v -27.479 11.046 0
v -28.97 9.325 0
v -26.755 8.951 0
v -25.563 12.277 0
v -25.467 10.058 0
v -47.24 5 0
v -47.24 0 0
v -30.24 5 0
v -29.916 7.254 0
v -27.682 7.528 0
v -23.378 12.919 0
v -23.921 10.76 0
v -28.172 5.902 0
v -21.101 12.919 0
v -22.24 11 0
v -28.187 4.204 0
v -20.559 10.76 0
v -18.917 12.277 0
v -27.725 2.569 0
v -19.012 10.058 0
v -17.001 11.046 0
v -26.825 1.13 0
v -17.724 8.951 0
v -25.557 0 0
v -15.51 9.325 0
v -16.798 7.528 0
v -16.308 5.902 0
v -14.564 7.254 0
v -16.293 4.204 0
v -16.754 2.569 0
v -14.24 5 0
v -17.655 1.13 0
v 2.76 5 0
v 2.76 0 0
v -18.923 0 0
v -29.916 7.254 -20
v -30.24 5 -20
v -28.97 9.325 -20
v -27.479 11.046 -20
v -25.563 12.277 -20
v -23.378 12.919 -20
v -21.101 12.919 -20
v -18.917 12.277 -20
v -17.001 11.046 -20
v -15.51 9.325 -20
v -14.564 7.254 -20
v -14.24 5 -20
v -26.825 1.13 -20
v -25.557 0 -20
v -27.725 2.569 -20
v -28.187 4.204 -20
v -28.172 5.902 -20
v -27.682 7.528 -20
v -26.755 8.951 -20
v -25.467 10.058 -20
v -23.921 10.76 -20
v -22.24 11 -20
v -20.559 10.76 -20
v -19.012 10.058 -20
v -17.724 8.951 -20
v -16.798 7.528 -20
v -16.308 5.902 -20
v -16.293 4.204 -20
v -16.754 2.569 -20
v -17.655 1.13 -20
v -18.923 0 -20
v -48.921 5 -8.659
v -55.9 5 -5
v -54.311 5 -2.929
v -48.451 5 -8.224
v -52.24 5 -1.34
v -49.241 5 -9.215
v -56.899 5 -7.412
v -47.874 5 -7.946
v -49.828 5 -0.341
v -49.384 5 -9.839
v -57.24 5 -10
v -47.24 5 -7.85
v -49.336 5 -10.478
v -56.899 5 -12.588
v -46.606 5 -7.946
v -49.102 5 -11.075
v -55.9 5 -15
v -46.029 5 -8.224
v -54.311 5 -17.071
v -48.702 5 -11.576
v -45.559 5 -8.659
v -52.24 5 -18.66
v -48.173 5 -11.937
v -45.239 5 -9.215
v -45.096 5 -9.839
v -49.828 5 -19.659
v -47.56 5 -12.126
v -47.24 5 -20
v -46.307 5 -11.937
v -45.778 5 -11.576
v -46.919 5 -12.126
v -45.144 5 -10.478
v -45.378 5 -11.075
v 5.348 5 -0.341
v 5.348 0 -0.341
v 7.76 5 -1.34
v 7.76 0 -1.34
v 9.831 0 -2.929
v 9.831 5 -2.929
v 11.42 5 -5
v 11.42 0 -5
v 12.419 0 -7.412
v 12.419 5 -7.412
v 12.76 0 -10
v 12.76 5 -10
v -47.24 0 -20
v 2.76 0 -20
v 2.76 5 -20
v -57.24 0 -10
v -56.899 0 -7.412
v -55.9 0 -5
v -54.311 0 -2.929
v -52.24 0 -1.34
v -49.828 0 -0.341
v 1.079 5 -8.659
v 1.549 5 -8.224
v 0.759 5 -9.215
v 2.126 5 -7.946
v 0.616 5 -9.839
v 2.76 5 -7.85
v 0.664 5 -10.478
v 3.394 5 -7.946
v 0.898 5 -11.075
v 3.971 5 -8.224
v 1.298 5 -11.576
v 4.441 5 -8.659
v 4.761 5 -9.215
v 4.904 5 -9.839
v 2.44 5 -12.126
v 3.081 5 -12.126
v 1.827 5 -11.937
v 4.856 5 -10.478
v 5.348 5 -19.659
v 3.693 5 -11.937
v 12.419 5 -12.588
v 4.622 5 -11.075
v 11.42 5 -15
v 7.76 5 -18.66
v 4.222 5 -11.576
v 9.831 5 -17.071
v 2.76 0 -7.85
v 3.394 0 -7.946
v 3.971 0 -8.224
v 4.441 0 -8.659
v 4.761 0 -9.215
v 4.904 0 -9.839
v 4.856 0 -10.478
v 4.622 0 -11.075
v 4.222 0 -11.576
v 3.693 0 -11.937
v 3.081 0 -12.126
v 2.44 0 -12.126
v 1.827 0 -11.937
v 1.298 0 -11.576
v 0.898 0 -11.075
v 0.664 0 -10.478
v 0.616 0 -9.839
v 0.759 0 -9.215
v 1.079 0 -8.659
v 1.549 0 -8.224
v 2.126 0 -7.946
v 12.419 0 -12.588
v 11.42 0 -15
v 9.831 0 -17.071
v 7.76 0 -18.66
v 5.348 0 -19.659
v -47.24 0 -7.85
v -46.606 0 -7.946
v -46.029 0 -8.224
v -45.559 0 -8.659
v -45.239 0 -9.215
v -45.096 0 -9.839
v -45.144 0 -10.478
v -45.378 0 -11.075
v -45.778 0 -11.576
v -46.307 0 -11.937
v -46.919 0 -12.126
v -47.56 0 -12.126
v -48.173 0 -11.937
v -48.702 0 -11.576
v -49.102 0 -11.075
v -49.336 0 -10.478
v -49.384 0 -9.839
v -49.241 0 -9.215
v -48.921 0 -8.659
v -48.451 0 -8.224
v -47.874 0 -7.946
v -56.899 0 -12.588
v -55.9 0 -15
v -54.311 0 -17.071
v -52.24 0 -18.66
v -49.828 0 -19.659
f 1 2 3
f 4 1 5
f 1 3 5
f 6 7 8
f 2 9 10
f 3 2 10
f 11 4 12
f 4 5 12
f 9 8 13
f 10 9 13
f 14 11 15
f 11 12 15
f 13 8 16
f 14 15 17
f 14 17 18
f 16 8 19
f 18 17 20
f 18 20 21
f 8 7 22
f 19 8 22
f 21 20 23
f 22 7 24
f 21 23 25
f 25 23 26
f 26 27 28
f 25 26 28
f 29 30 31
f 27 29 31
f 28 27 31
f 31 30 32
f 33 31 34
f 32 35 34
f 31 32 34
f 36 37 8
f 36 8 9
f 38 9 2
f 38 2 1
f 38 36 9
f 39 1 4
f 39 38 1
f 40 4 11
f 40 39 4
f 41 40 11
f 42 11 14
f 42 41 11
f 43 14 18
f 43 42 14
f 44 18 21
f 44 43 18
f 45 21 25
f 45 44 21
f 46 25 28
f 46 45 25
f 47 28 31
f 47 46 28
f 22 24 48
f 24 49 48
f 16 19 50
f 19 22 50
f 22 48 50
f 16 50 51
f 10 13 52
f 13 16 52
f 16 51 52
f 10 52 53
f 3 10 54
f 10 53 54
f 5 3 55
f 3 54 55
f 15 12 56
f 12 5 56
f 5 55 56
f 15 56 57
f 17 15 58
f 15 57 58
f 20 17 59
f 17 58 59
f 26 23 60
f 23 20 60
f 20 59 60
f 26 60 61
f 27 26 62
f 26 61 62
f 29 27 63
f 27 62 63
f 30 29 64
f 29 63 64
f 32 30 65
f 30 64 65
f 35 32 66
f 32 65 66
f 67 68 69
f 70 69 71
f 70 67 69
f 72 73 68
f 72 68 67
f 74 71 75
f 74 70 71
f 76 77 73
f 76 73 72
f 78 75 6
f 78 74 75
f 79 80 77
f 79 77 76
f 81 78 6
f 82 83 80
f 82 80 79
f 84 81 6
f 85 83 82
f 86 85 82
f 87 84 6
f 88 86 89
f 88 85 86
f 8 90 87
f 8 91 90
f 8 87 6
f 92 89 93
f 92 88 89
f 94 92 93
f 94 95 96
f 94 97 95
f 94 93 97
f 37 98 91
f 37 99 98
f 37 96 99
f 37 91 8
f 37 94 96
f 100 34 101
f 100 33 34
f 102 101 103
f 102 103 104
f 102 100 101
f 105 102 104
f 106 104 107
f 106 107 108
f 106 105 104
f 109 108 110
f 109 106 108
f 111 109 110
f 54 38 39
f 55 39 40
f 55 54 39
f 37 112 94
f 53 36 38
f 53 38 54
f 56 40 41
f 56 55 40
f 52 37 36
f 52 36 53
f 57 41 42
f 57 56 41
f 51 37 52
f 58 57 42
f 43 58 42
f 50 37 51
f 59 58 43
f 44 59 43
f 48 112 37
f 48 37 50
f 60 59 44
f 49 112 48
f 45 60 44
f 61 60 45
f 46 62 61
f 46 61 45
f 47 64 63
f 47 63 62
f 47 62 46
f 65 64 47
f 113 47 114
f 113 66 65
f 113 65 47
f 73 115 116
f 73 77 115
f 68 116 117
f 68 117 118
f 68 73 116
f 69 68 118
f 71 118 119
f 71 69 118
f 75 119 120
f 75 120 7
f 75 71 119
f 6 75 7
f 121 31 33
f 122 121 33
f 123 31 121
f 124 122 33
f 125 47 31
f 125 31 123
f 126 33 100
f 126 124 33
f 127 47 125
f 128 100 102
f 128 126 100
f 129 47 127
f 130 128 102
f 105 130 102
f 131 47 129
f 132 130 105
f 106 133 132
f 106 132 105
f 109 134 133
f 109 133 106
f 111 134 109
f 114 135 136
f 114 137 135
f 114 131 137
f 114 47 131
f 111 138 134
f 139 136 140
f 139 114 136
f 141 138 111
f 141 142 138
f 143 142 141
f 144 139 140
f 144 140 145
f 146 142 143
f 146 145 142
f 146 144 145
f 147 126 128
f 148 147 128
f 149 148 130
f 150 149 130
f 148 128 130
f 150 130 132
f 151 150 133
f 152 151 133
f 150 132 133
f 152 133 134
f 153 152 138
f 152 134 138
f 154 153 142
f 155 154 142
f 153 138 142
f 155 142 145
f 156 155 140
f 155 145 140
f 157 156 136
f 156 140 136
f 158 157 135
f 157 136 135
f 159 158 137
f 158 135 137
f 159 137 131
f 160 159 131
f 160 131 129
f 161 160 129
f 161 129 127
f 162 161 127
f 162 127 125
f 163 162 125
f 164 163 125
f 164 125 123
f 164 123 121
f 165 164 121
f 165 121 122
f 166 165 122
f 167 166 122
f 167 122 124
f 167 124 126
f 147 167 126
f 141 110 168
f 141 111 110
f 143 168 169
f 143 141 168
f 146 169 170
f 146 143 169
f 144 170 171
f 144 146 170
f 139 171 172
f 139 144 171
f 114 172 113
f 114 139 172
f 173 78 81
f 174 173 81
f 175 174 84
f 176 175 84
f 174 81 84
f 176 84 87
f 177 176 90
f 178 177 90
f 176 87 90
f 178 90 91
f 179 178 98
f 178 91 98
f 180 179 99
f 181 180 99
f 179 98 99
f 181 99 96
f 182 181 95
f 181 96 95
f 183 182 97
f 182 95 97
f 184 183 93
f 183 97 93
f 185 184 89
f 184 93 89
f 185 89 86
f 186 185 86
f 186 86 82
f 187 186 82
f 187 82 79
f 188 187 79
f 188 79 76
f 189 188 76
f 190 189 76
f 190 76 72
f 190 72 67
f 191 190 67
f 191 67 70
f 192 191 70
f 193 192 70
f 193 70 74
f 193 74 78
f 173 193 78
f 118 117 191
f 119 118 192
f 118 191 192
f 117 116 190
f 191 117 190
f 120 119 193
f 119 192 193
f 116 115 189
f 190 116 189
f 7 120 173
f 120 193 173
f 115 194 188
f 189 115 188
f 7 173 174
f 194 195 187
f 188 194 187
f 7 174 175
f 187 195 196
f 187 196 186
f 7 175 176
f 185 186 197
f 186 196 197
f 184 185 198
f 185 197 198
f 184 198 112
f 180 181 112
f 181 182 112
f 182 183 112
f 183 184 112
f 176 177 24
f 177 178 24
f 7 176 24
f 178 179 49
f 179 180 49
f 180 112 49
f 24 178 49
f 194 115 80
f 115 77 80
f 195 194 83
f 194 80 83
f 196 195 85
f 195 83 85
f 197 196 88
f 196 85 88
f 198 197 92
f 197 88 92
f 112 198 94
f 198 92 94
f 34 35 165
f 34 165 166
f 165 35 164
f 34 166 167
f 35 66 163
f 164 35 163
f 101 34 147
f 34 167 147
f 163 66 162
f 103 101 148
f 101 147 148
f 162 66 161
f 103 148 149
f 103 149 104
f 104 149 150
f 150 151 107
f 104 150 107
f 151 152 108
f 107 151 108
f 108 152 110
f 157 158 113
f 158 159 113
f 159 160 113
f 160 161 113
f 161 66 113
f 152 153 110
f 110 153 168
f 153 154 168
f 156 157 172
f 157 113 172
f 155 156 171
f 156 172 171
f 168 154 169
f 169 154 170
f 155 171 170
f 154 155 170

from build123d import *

# Parameters (mm, degrees)
SKETCH1_W           = 70
SKETCH1_H           = 20
BOSS_EXTRUDE1_DEPTH = 5
FILLET1_R           = 10
SKETCH2_R           = 2.15
CUT_EXTRUDE1_DEPTH  = 10
BOSS_EXTRUDE2_DEPTH = 20
SKETCH6_R           = 6
CUT_EXTRUDE3_DEPTH  = 20


with BuildPart() as part:
    # Sketch1 → Boss-Extrude1 (new body)
    with BuildSketch(Plane(origin=(0, 0, 0), x_dir=(1, 0, 0), z_dir=(0, 1, 0))):
        with Locations((-22.239915074, 10)):
            Rectangle(SKETCH1_W, SKETCH1_H)
    extrude(amount=BOSS_EXTRUDE1_DEPTH)

    # Fillet1
    fillet1_edges = [part.edges().sort_by_distance(p)[0] for p in [
        (12.760084926, 2.5, 0),
        (12.760084926, 2.5, -20),
        (-57.239915074, 2.5, 0),
        (-57.239915074, 2.5, -20),
    ]]
    fillet(fillet1_edges, radius=FILLET1_R - 0.0001)  # a hair under: the kernel refuses the full size

    # Sketch2 → Cut-Extrude1 (cut)
    with BuildSketch(Plane(origin=(0, 5, 0), x_dir=(1, 0, 0), z_dir=(0, 1, 0))):
        with Locations(Location((-47.239915074, 10, 0), (0, 0, 270))):
            Circle(SKETCH2_R)
        with Locations(Location((2.760084926, 10, 0), (0, 0, 270))):
            Circle(SKETCH2_R)
    extrude(amount=-CUT_EXTRUDE1_DEPTH, mode=Mode.SUBTRACT)

    # Sketch3 → Boss-Extrude2 (add)
    with BuildSketch(Plane(origin=(0, 0, -20), x_dir=(-1, 0, 0), z_dir=(0, 0, -1))):
        with BuildLine():
            Line((14.239915074, 5), (30.239915074, 5))
            ThreePointArc((30.239915074, 5), (22.239915074, 13), (14.239915074, 5))
        make_face()
    extrude(amount=-BOSS_EXTRUDE2_DEPTH)

    # Sketch6 → Cut-Extrude3 (cut)
    with BuildSketch(Plane(origin=(0, 0, -20), x_dir=(-1, 0, 0), z_dir=(0, 0, -1))):
        with Locations((22.239915074, 5)):
            Circle(SKETCH6_R)
    extrude(amount=-CUT_EXTRUDE3_DEPTH, mode=Mode.SUBTRACT)


solid = part.part
